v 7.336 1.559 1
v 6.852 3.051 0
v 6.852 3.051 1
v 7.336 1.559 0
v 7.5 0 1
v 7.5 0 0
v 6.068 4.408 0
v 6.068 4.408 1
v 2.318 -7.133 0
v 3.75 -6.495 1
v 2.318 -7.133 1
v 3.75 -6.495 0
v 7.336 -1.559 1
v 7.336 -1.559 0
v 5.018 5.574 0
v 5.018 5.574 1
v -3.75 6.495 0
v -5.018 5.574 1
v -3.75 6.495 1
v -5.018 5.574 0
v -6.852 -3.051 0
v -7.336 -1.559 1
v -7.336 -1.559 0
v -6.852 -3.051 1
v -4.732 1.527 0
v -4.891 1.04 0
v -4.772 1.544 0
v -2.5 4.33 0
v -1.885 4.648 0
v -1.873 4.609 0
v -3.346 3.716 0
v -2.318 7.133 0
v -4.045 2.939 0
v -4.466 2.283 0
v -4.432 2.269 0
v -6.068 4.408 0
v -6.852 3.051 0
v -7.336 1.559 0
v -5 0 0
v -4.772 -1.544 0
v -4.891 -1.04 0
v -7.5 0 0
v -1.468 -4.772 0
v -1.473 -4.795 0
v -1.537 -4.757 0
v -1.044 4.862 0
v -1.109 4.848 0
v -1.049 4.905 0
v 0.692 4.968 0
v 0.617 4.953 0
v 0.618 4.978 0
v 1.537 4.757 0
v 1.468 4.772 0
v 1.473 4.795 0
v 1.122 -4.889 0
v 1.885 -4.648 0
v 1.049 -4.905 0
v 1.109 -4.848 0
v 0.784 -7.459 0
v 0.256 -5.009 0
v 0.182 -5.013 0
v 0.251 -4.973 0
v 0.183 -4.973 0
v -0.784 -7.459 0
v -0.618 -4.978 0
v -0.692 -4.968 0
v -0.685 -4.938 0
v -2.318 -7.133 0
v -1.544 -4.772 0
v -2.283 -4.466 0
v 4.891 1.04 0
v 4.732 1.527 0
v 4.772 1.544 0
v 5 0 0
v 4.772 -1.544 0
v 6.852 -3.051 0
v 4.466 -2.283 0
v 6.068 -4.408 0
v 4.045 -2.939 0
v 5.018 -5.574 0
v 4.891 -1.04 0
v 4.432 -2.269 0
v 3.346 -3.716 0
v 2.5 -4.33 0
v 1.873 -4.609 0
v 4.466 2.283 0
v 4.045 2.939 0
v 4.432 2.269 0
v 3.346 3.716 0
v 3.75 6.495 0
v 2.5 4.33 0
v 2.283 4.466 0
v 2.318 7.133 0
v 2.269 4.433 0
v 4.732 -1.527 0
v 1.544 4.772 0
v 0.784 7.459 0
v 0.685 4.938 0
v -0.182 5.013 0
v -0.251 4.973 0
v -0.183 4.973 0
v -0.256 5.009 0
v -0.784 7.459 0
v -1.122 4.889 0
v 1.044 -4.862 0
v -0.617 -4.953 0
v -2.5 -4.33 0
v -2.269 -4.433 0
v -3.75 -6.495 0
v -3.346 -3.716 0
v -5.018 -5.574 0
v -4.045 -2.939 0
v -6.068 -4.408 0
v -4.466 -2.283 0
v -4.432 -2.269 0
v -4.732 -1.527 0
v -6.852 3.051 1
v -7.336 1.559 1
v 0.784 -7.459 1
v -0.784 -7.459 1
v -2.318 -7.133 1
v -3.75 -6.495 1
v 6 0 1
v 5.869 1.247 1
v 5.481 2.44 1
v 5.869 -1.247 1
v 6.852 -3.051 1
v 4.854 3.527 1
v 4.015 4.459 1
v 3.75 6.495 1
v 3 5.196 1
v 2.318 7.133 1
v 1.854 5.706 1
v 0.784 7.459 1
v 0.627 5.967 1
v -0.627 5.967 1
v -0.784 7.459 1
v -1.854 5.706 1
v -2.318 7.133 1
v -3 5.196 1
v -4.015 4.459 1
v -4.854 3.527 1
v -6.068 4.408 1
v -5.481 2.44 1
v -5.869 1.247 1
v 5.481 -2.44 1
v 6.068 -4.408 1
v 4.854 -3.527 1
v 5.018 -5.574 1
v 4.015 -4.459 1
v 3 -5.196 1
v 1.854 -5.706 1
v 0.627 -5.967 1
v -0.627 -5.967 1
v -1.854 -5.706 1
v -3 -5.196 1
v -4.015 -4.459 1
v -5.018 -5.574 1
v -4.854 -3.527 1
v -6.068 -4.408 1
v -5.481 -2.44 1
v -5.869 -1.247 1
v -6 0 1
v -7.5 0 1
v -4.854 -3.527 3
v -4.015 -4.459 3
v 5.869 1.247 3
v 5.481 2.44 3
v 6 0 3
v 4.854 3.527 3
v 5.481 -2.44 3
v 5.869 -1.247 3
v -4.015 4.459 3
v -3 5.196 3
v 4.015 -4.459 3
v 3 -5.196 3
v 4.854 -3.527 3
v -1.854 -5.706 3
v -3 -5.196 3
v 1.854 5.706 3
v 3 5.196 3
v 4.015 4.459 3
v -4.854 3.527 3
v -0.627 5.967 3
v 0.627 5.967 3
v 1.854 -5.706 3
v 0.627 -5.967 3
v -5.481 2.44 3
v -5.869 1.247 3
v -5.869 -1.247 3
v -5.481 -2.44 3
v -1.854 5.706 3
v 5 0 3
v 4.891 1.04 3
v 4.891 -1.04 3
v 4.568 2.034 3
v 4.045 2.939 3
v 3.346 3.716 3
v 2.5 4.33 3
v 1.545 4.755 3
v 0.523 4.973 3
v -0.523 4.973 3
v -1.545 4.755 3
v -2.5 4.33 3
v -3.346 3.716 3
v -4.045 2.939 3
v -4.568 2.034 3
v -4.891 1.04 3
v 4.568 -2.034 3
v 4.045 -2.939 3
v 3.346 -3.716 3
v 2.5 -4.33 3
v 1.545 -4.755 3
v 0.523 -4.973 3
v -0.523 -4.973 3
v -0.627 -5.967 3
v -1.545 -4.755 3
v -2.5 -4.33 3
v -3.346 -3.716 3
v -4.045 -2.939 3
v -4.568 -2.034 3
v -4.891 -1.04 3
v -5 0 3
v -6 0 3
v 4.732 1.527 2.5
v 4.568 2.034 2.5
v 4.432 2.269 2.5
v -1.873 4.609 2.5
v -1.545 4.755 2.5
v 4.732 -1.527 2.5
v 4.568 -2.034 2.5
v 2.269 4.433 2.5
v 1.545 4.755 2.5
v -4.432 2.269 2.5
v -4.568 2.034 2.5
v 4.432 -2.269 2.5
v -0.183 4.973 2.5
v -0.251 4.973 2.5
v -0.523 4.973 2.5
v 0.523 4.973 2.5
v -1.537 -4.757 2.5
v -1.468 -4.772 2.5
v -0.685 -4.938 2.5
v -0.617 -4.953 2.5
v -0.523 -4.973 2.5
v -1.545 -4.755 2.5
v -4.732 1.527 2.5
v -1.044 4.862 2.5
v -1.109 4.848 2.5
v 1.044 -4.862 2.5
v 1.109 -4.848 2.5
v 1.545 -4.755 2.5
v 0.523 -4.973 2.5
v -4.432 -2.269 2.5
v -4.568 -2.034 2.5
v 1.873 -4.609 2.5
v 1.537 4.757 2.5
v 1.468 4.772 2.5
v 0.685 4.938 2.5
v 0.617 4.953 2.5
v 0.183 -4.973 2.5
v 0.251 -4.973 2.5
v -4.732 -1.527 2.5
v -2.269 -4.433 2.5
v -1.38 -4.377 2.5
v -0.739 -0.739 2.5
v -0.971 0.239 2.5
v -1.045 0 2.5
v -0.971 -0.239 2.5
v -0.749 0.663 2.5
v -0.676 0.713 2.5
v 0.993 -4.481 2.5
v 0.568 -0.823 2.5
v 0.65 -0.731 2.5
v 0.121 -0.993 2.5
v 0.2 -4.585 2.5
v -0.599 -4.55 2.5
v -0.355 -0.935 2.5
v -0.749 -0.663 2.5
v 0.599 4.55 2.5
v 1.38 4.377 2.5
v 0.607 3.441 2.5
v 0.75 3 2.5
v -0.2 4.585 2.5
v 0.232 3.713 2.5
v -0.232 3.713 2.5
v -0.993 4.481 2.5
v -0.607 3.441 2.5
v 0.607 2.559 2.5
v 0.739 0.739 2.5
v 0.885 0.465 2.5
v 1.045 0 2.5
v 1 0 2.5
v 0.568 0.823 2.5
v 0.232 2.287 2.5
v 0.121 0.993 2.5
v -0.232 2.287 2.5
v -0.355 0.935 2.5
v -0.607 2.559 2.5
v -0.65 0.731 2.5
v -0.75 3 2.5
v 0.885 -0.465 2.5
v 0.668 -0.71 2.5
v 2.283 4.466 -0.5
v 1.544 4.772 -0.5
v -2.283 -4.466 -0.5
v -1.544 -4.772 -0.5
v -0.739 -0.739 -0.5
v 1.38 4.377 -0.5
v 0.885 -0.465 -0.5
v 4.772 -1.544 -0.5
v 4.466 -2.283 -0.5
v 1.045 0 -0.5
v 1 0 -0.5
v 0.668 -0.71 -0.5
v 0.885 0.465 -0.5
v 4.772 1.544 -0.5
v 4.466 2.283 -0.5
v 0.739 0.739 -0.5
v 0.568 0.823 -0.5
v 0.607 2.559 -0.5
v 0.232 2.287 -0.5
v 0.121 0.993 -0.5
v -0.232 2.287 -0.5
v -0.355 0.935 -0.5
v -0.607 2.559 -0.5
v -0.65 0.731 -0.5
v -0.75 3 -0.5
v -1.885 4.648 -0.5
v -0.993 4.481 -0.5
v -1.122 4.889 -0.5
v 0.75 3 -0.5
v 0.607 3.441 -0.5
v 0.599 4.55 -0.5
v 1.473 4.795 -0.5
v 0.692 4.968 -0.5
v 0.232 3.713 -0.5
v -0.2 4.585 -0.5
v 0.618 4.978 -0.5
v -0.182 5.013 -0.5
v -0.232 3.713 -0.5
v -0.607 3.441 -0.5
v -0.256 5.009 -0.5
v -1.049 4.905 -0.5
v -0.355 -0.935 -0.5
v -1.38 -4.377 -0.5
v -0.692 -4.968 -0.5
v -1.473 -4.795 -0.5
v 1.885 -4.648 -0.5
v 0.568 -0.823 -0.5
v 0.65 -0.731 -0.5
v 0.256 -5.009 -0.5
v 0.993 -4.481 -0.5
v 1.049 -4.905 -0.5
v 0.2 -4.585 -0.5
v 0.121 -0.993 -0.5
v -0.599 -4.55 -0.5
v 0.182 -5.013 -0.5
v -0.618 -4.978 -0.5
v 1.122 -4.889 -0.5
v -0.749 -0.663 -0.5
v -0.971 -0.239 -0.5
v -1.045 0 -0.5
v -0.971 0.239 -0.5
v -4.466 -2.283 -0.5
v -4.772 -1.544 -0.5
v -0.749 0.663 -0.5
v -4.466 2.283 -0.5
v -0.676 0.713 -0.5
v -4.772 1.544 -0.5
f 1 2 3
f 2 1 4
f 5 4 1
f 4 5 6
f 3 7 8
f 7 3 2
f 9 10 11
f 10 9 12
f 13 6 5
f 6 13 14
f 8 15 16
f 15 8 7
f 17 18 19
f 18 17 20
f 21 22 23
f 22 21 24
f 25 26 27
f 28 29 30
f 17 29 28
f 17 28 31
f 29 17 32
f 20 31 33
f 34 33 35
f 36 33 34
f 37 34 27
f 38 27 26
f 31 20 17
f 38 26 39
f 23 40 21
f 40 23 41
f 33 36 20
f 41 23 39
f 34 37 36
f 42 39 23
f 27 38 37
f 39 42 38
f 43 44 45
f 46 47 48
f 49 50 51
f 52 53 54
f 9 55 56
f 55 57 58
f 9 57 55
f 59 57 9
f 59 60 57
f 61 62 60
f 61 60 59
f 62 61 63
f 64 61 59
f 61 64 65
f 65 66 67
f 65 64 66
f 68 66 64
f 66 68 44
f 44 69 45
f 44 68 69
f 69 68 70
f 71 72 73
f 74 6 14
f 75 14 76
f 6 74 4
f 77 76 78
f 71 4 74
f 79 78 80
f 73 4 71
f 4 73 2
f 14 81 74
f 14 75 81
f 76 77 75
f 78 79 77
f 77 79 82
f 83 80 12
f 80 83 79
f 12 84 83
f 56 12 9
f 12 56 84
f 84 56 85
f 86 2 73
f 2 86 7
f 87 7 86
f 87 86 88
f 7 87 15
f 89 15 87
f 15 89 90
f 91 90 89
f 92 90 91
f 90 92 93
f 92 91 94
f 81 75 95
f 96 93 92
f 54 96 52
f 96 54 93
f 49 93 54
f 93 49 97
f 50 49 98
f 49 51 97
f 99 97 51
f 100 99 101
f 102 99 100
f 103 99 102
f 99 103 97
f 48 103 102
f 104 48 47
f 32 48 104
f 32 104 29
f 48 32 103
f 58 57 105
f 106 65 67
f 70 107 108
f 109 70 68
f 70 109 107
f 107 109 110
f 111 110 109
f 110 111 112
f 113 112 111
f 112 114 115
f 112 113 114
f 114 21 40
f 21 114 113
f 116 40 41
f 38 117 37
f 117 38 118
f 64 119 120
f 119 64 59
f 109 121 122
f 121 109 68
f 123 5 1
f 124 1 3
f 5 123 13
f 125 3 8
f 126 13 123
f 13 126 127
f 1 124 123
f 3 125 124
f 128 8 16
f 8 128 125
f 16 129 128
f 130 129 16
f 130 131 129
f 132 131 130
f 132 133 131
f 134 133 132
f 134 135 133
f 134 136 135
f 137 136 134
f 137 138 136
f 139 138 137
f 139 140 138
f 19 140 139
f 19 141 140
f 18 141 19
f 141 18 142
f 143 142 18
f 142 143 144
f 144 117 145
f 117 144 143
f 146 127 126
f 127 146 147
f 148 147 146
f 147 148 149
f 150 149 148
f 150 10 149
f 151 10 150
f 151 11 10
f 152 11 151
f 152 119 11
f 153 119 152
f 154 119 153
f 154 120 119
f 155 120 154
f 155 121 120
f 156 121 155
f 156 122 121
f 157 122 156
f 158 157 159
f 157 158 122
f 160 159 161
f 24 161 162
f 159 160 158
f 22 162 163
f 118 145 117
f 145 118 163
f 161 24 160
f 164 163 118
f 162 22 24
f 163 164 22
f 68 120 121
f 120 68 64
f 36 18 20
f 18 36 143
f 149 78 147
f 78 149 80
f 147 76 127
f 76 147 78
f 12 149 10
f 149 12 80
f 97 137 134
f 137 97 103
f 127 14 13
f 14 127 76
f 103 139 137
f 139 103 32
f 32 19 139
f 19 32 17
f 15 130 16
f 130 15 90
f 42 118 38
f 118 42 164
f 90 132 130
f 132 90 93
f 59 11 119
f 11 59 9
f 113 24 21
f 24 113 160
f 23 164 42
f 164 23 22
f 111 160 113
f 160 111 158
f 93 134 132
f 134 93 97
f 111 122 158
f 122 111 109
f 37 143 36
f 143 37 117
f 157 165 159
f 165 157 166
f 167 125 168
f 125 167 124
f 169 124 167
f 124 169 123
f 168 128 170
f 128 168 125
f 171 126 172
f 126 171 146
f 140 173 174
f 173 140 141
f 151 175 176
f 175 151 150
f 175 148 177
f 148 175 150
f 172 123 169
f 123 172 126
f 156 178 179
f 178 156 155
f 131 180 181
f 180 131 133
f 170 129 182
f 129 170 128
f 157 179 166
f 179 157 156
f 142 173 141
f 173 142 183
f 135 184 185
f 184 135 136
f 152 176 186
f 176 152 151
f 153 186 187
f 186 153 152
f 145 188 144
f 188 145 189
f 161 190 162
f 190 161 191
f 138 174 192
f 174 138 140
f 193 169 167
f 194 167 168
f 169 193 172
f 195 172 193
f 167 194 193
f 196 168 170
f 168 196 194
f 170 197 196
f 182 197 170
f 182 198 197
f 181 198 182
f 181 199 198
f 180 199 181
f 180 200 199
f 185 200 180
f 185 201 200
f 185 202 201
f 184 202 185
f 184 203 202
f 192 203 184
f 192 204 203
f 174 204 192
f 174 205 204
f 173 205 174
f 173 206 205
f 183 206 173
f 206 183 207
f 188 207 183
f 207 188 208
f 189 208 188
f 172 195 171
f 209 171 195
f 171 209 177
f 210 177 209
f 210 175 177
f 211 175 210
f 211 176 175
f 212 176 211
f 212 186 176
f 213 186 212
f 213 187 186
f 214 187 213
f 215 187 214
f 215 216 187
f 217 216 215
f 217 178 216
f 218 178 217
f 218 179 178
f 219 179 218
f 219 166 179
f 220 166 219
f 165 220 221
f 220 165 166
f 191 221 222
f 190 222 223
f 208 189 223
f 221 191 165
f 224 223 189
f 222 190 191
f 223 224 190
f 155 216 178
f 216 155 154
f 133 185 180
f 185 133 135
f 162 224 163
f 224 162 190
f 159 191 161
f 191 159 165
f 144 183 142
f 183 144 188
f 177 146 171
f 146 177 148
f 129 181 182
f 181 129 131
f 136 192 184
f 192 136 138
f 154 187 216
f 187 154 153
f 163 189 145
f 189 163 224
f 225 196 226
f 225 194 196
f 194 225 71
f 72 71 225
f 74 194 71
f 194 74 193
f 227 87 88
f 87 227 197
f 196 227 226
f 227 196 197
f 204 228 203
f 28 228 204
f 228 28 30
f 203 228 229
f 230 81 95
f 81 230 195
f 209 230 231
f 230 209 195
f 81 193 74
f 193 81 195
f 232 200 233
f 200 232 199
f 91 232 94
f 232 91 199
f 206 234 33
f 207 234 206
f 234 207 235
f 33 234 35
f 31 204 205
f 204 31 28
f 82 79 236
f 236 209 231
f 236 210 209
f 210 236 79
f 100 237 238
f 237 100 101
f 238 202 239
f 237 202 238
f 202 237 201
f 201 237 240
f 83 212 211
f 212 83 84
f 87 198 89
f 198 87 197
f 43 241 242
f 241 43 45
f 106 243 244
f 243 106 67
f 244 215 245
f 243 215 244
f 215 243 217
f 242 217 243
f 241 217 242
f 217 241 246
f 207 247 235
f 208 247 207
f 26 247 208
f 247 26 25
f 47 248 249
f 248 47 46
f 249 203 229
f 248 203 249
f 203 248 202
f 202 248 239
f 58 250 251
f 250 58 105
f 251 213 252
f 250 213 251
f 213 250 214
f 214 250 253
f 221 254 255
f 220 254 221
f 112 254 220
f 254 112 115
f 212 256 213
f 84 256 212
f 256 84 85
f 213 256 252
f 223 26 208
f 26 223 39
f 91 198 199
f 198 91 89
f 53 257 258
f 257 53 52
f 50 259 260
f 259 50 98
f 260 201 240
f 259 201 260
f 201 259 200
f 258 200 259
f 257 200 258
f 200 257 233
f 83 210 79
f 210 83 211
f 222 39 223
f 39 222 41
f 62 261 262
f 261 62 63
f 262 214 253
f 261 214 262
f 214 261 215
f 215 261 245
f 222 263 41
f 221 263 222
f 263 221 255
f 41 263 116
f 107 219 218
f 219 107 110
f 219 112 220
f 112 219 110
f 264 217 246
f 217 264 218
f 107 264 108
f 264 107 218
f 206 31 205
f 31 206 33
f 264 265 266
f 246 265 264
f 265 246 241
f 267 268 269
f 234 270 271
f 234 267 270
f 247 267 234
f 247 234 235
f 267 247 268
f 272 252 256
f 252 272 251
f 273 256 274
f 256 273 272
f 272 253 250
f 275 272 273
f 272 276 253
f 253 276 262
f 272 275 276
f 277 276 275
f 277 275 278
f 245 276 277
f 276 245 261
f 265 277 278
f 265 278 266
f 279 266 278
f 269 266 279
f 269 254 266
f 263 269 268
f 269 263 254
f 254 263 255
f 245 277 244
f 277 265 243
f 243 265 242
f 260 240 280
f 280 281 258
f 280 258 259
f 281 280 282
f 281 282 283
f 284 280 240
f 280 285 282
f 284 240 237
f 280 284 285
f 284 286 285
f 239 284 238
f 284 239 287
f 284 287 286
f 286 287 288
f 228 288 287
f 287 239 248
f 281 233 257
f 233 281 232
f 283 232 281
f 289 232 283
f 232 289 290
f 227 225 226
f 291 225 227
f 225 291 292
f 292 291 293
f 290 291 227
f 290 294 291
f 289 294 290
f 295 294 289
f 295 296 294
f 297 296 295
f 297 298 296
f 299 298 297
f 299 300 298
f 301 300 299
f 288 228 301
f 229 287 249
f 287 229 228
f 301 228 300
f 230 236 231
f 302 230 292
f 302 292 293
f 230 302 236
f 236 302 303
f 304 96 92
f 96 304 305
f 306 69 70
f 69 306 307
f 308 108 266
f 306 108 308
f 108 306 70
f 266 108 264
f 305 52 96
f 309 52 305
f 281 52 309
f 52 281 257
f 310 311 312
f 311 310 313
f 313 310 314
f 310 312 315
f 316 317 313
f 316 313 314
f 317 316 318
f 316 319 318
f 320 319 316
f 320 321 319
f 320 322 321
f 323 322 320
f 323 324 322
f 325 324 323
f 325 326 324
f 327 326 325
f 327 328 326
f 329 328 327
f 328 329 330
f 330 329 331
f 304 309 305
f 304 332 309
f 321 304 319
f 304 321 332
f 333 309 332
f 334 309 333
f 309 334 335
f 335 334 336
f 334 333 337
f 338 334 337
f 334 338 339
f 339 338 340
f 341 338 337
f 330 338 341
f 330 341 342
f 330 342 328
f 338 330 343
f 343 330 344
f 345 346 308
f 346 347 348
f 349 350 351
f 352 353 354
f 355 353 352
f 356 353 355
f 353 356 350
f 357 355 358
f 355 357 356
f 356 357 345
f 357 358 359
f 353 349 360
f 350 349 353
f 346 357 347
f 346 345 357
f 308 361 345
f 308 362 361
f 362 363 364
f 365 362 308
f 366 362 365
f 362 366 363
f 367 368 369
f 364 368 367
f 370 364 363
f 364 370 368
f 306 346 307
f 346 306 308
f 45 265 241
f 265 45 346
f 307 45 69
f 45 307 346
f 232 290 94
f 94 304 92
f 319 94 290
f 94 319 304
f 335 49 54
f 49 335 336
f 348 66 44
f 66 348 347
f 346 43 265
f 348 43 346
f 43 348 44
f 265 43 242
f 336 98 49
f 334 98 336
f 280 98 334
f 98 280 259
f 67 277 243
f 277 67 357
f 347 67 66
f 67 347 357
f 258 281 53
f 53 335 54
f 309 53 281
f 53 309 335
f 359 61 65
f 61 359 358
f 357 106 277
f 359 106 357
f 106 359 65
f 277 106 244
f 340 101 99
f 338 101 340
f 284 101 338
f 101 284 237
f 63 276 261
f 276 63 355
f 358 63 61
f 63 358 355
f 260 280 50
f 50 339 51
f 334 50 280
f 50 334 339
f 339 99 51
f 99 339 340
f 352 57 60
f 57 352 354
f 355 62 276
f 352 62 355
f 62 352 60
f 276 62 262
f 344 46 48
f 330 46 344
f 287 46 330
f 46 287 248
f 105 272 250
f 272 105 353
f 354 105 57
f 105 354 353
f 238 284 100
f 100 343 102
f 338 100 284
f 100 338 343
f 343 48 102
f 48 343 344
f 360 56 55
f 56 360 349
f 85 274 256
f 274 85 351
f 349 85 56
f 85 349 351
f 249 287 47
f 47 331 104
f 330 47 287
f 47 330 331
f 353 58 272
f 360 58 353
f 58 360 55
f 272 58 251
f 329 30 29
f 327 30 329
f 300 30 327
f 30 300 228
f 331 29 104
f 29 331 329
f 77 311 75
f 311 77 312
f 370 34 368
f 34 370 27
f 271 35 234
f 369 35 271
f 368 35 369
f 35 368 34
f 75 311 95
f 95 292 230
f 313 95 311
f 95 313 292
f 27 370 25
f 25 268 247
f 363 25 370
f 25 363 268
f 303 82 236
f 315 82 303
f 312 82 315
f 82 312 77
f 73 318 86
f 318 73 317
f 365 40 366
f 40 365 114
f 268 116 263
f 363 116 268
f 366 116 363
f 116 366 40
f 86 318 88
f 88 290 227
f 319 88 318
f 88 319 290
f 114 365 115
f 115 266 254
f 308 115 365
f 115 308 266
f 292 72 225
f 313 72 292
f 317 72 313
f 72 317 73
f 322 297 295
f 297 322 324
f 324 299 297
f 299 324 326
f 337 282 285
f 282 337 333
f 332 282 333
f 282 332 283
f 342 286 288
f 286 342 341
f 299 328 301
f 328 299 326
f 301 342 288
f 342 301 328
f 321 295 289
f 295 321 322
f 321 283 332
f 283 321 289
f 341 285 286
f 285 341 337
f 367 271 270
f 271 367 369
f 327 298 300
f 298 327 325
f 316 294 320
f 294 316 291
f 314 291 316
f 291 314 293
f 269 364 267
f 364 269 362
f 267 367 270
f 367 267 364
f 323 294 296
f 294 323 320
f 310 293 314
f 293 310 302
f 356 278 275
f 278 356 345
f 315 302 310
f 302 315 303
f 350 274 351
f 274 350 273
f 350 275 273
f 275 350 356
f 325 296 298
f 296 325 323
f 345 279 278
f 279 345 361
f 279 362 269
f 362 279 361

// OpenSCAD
// Dubs "A" class locomotive
//Measurements 1:64 scale in mm
$fs=0.5;
clearance=0.5; //why?
lengthBetweenBuffers=74;
trackGauge=16.5;
frameThickness=1;
frameSideHeight=10;
axleDiameter=2.5;
frameOutsideSpacing=14;
frameInsideSpacing=frameOutsideSpacing-frameThickness*2;
bufferPlateHeight=5;
bufferPlateLength=31;

frontAxleFromFrontDistance=20;
rearAxleFromFrontDistance=47;
axleHeight=axleDiameter;
boilerCentreHeight=19;

motorLength= 15;
motorDiameter=6;
motorShaftLength=6;
motorShaftDiameter=1.5;

frictionWheelDiameter=16;
frictionWheelThickness=3;
frictionWheelX=frictionWheelDiameter/2+motorShaftDiameter/2;

driveShaftDiameter=2.5;


wormGearLength=8;
wormGearDiameter=4.6;

gearDiameter=12;
gearThickness=2;



motorMountThickness=2;
motorMountLength=motorLength+motorShaftLength+motorMountThickness+2;
frameIntersection=6;
motorMountDepth=frameInsideSpacing;
driveShaftLength=motorMountLength+motorMountThickness+1;

wheelRimOutsideDiameter=12;
wheelRimInsideDiameter=10;
wheelFlangeDiameter=15;
wheelNumberSpokes=14;
wheelSpokeThickness=0.8;
wheelTreadThickness=3;
wheelFlangeThickness=1;
wheelHubDiameter=5;
wheelThickness=wheelTreadThickness+wheelFlangeThickness;

frontWheelPosition=[frontAxleFromFrontDistance,0,axleHeight];
rearWheelPosition=[rearAxleFromFrontDistance,0,axleHeight];

boilerLength=55;
boilerDiameter=15;
boilerDistance=5;
basePlateThickness=1;
basePlateLength=lengthBetweenBuffers;
basePlateWidth=31;

module gear() {
    color("white") cylinder(h=gearThickness,d=gearDiameter,center=true);
}

module axle() {
    rotate ([90,0,0])  cylinder(h=60,d=axleDiameter,center=true);
}

module spokes() {
    difference() {
        union() {
    rotate([0,0,0-22.5]) cube([wheelRimInsideDiameter,wheelSpokeThickness,wheelTreadThickness] ,center=true);
    rotate([0,0,45-22.5]) cube([wheelRimInsideDiameter,wheelSpokeThickness,wheelTreadThickness] ,center=true);
    //balances
     for (i=[90:10:135]) { 
        rotate([0,0,i-22.5]) cube([wheelRimInsideDiameter,wheelSpokeThickness,wheelTreadThickness] ,center=true);
        }
    }
    union() {
    //pin hole
    translate([0,wheelRimOutsideDiameter/4,0]) cylinder(h=wheelTreadThickness+0.1,d=1.5 ,center=true);
      //axle Hole
        cylinder(h=wheelTreadThickness+0.1,d=2 ,center=true);
        
    }
}
}

module wheel() {
    //rim and flange
    difference() {
        union() {
        cylinder(h=wheelFlangeThickness,d=wheelFlangeDiameter );
        cylinder(h=wheelTreadThickness,d=wheelRimOutsideDiameter );
    }
              cylinder(h=wheelTreadThickness+0.1,d=wheelRimInsideDiameter );
    }
 translate([0,0,wheelFlangeThickness]) spokes();
    
    }

!wheel();
    
module frictionWheel() {
    cylinder(h=frictionWheelThickness,d=frictionWheelDiameter);
}

module wheelAssembly() {
    rotate ([90,0,0]) 
        union() {
            translate([0,0,-frameOutsideSpacing]) wheel();
            translate([0,0,frameOutsideSpacing-wheelThickness]) wheel();
            gear();
    }
}

module motor() {
    color("red") cylinder(h=motorLength,d=motorDiameter);
    translate([0,0,motorLength/2+motorShaftLength]) cylinder(h=motorShaftLength,d=motorShaftDiameter);
}

module driveShaft() {
     cylinder(h=driveShaftLength,d=driveShaftDiameter);
}

module wormGear() {
    color("white")  cylinder(h=wormGearLength,d=wormGearDiameter);
}

module motorMount() {
       color("yellow") 
    difference() {
           union() {
    //top
    cube([motorMountThickness,motorMountDepth,motorMountLength]);
    //worm end
    translate([0,0,-motorMountThickness]) cube([frictionWheelX+motorDiameter+driveShaftDiameter+frameIntersection,motorMountDepth,motorMountThickness]);
    //friction Wheel end
    translate([0,0,motorMountLength-motorMountThickness]) cube([frictionWheelX+motorDiameter+driveShaftDiameter+frameIntersection,motorMountDepth,motorMountThickness]);
    //motor housing
    motorMountMotorHousingDepth=motorDiameter+motorMountThickness*2;
    translate([motorMountThickness,motorMountDepth/2-motorMountMotorHousingDepth/2,0]) cube([motorDiameter/1.4,motorMountMotorHousingDepth,motorLength]);
           }
           union() {
              //space for motor body
               translate([motorMountThickness,motorMountDepth/2-motorDiameter/2,0]) cube([motorDiameter+clearance,motorDiameter+clearance,motorLength+0.2]);
               //hole for motor wires
               translate([motorDiameter-motorMountThickness/2,motorMountDepth/2,-5]) cylinder(h=motorLength,d=2.5);
               //space for inserting motor
               translate([motorDiameter,(motorDiameter-2.1)/2,0]) cube([motorDiameter+1.6,motorDiameter+2.2,motorLength]);
               //drive shaft
                             translate([frictionWheelX+motorDiameter/2+motorMountThickness,motorMountDepth/2,-2]) driveShaft(); 
           }
    }
}

//!motorMount();

module motorAssembly() {
   difference() {
       union() {
           translate([frictionWheelX,0,motorLength+motorShaftLength/2-frictionWheelThickness/2]) frictionWheel();

    translate([frictionWheelX,0,wormGearLength/2]) wormGear();
    translate([-motorDiameter/2-motorMountThickness,-motorMountDepth/2,0]) motorMount();
    motor();
       }
       union() {

       }
   }
}

//motorAssembly();

module frameSideBlock() {
    union() {
        cube([lengthBetweenBuffers,frameThickness,frameSideHeight]);
    }
}

module frameCutout() {
    intersection() {
        translate([frameSideHeight/2,frameThickness-0.1,0]) rotate([90,0,0]) cylinder(h=frameThickness*2+0.2,d=frameSideHeight);
        translate([frameSideHeight/2,-frameThickness-0.1,0]) cube([frameSideHeight/2,frameThickness*2+0.2,frameSideHeight/2]);  
    }
            translate([-4,-frameThickness-0.1,0]) cube([frameSideHeight,frameThickness*2+0.2,frameSideHeight/2]); 
}

frameCutoutLength=frameSideHeight;

//!frameCutout();



module frameSide() {
    difference() {
        union() {
    frameSideBlock();
        
        }
    union() {
    translate([frontAxleFromFrontDistance+frameCutoutLength+axleDiameter,0,0]) rotate([0,0,180]) frameCutout();
            translate([rearAxleFromFrontDistance-frameCutoutLength-axleDiameter,0.2,0])  frameCutout();
                   translate([rearAxleFromFrontDistance+frameCutoutLength+axleDiameter,0,0])  rotate([0,0,180]) frameCutout();
                    translate([rearAxleFromFrontDistance+frameCutoutLength*2+axleDiameter,0,0])   frameCutout();
    }
    }
}


module bufferPlate() {
      translate([0,0,frameSideHeight-bufferPlateHeight/2-frameThickness]) rotate([0,90,0]) {
          radius=2;
    x=bufferPlateHeight;
    y=bufferPlateLength;
    z=frameThickness;
    linear_extrude(height=z)
hull()
{

    // place 4 circles in the corners, with the given radius
    translate([(-x/2)+(radius/2), (-y/2)+(radius/2), 0])
    circle(r=radius);

    translate([(x/2)-(radius/2), (-y/2)+(radius/2), 0])
    circle(r=radius);

    translate([(-x/2)+(radius/2), (y/2)-(radius/2), 0])
    circle(r=radius);

    translate([(x/2)-(radius/2), (y/2)-(radius/2), 0])
    circle(r=radius);
}

}
}

module frame() {
    difference() {
        union() {
                translate([0,frameInsideSpacing/2,0]) frameSide();
            translate([0,-frameOutsideSpacing/2,0]) frameSide();
    bufferPlate();
                    translate([lengthBetweenBuffers,0,0]) bufferPlate();
        }
        union() {
            translate(frontWheelPosition) axle();
            translate(rearWheelPosition) axle();

        }}
        
}

//!frame();

module boiler() {
    rotate([0,90,0]) cylinder(h=boilerLength,d=boilerDiameter);
}

module basePlate() {
    cube([lengthBetweenBuffers,bufferPlateLength,basePlateThickness]);
}

module loco() {

            frame();
            translate(frontWheelPosition) wheelAssembly();
            translate(rearWheelPosition) wheelAssembly();
            translate([8,0,+15]) translate(rearWheelPosition) rotate([0,90,180])  motorAssembly();
    translate([boilerDistance,0,boilerDiameter/2+frameSideHeight+basePlateThickness]) boiler();
    translate([0,-basePlateWidth/2,frameSideHeight]) basePlate();
                      
 
  
}
    
    loco();
